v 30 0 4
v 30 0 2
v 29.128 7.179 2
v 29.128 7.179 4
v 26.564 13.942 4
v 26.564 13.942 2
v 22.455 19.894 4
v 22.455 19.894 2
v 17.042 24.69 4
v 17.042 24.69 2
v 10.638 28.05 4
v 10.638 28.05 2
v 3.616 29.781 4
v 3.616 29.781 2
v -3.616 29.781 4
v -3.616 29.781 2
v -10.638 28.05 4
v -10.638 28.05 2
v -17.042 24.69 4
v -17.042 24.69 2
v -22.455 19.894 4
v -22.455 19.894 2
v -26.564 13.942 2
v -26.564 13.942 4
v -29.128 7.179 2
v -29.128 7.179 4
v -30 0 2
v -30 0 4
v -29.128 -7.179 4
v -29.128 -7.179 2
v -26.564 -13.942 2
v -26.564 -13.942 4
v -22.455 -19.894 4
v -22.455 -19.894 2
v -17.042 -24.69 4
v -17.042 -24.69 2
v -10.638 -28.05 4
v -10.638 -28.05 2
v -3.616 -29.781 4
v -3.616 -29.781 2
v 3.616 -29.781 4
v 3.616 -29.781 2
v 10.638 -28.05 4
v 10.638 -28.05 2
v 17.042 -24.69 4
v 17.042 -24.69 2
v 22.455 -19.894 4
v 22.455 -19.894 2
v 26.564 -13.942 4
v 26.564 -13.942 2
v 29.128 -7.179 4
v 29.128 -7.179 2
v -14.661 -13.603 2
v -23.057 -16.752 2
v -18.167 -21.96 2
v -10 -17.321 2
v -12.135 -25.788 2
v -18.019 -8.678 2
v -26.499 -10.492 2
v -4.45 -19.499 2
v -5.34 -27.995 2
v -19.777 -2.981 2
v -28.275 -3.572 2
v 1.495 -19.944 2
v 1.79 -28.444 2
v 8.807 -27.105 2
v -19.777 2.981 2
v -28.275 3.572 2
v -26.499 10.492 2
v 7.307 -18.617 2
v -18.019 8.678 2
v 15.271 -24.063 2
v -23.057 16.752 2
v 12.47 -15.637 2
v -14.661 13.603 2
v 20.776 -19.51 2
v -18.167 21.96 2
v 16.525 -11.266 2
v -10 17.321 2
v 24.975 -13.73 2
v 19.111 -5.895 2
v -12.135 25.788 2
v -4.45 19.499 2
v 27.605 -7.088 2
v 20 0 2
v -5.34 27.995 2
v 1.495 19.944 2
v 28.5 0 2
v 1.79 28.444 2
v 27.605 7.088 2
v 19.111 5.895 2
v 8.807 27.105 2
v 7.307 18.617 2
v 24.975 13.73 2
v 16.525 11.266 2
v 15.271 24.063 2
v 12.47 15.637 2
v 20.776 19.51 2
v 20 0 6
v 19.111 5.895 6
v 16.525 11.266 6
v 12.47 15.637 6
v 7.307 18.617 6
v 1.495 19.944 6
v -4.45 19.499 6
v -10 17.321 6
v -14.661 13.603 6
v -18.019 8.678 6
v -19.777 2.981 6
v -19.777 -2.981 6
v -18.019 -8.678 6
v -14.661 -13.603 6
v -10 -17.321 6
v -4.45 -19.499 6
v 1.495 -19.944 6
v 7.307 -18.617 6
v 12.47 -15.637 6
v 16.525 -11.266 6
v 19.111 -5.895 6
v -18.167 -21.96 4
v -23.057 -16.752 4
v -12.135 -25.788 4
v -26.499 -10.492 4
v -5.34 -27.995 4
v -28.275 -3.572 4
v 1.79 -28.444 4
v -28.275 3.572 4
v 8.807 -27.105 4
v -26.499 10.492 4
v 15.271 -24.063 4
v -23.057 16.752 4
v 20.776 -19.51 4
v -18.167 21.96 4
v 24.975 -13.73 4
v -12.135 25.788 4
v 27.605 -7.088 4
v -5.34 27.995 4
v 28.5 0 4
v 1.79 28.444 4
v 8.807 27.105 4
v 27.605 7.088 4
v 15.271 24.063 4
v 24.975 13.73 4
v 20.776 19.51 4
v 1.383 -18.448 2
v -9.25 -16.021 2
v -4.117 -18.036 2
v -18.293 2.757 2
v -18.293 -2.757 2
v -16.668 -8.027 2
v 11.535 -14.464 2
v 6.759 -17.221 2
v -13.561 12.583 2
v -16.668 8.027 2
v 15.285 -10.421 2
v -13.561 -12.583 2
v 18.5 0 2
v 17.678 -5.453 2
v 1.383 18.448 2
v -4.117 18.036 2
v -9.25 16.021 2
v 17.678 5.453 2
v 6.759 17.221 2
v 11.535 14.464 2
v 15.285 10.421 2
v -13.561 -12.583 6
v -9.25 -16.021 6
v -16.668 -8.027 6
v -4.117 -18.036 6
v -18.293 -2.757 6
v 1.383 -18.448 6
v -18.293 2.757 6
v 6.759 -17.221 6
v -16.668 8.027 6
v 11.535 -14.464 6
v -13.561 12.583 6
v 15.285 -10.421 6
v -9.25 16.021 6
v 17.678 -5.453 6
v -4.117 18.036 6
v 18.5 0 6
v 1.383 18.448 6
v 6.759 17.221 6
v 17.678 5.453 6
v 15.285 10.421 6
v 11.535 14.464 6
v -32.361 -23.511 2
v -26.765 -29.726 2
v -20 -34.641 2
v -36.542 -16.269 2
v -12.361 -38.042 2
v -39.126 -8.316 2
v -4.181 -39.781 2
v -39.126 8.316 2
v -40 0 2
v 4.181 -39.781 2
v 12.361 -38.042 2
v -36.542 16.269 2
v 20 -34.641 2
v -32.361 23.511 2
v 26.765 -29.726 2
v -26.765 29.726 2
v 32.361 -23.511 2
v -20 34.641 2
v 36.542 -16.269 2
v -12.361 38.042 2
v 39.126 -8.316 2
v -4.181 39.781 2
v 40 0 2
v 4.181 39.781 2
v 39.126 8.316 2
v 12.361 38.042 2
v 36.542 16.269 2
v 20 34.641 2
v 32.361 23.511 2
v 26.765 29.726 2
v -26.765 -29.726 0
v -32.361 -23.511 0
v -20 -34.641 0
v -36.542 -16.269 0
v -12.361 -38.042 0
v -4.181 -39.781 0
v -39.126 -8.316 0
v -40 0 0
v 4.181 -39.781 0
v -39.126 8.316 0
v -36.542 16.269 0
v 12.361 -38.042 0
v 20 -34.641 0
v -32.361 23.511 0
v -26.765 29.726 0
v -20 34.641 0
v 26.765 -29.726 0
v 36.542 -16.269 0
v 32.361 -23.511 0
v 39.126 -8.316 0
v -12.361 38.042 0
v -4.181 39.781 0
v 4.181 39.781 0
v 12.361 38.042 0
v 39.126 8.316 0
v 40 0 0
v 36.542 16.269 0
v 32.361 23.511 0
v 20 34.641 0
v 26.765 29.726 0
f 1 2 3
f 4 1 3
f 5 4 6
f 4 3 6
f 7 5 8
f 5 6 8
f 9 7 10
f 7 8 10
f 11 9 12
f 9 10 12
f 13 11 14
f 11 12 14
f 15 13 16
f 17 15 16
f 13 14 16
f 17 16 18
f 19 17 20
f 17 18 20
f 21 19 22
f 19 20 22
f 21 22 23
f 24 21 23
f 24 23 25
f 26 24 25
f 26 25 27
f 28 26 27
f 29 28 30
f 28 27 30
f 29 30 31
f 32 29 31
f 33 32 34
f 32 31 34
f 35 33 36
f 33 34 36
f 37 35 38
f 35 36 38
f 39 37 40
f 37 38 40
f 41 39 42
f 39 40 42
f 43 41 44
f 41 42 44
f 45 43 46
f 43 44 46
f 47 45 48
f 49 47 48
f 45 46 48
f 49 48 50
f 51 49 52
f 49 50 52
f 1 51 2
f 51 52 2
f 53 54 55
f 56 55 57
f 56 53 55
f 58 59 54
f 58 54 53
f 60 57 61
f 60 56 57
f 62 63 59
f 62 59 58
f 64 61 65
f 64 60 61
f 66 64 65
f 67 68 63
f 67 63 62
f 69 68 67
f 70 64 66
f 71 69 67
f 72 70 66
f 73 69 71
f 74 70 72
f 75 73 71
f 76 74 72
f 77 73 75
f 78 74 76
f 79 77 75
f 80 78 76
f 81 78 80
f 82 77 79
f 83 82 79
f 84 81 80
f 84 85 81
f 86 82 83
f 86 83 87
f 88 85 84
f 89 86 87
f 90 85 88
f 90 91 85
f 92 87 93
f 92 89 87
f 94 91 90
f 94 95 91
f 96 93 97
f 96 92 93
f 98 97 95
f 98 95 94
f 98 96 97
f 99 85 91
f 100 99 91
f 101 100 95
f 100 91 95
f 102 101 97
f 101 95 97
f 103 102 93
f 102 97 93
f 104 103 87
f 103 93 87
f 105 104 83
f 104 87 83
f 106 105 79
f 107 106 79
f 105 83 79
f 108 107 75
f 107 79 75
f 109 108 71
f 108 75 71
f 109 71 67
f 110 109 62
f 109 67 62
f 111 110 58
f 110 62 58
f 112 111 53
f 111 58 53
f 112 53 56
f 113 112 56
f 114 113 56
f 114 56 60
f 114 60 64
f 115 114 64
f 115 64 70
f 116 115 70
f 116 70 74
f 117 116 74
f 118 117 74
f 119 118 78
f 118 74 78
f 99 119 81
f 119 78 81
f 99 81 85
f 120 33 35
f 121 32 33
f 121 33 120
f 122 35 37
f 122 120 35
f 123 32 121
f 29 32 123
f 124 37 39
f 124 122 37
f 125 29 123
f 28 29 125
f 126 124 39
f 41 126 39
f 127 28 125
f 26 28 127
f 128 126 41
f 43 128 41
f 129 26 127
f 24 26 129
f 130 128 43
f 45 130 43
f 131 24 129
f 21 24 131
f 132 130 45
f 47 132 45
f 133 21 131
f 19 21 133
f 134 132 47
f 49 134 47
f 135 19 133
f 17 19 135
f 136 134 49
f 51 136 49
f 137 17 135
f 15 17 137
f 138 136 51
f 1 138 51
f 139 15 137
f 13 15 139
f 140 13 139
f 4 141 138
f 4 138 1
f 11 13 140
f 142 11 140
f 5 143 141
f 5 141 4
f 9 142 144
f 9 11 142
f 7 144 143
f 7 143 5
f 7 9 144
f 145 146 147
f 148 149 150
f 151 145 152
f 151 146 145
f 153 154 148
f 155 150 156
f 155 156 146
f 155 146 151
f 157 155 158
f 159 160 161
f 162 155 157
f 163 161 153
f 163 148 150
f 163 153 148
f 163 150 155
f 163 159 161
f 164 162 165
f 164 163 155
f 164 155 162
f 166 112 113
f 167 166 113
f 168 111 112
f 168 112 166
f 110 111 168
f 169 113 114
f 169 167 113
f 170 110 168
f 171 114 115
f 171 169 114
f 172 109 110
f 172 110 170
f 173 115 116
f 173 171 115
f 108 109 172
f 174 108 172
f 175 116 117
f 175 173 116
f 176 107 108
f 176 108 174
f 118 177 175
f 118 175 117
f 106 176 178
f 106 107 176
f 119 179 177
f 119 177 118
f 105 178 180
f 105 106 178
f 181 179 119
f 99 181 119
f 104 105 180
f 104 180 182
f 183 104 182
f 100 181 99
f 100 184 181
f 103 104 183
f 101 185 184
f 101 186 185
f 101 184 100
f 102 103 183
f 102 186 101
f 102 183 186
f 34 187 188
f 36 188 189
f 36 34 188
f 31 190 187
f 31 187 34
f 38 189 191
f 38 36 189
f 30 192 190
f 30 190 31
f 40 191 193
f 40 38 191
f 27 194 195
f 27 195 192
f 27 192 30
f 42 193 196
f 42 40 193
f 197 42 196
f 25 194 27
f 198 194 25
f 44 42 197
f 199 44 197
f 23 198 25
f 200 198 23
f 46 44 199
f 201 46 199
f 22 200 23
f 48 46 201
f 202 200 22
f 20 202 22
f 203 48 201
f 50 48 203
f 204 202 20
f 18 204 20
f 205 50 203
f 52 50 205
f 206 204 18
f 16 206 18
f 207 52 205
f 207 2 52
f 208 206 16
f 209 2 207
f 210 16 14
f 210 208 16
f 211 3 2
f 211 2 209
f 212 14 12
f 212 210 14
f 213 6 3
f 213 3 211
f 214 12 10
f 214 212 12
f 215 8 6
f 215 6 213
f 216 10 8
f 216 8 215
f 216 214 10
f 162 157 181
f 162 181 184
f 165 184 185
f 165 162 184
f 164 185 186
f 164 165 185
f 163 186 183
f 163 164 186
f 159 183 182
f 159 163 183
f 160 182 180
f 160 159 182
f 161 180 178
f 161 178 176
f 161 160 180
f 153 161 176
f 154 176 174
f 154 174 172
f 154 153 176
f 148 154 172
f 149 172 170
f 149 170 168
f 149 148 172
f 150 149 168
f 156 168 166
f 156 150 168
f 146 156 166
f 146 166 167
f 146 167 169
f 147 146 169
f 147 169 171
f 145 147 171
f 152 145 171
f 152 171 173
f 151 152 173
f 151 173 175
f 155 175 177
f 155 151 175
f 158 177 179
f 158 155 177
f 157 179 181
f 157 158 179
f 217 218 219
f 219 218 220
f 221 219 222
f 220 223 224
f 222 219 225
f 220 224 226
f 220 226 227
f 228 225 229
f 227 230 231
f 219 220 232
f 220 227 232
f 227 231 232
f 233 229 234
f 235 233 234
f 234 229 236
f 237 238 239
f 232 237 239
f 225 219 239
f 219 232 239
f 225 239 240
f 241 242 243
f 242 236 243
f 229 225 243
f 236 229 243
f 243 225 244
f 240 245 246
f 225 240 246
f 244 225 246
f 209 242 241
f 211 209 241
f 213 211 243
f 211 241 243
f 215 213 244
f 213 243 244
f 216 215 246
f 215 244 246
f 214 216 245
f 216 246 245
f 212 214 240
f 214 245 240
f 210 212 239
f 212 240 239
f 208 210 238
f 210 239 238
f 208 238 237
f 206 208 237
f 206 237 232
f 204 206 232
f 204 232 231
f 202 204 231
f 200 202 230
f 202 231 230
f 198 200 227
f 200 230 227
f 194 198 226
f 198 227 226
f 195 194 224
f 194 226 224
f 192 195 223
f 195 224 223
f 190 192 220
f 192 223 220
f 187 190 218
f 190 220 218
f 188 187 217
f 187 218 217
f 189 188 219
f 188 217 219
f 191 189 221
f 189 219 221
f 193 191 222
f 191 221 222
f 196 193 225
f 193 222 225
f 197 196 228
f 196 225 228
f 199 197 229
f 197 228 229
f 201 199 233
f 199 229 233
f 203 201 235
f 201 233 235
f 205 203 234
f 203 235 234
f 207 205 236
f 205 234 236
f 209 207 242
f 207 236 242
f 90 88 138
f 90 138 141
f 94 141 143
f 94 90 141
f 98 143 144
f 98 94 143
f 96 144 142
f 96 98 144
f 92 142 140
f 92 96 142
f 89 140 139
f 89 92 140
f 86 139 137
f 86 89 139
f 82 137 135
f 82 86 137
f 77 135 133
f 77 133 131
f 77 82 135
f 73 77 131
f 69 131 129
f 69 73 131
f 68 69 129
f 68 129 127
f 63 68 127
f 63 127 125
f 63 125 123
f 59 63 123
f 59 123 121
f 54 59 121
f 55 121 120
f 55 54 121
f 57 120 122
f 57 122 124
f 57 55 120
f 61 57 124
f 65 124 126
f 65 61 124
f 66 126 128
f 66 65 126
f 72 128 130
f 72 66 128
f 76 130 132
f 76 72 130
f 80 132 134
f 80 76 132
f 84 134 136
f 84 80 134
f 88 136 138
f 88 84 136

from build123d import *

# Parameters (mm, degrees)
F0_R     = 40
F1_DEPTH = 2
F2_R     = 30
F2_R_2   = 28.5
F3_DEPTH = 2
F4_R     = 20
F4_R_2   = 18.5
F5_DEPTH = 4


with BuildPart() as f1:
    # F0 (on Top) → F1 (new body)
    with BuildSketch(Plane.XY):
        Circle(F0_R)
    extrude(amount=F1_DEPTH)

    # F2 (on face) → F3 (join)
    with BuildSketch(Plane.XY.offset(2)):
        Circle(F2_R)
        Circle(F2_R_2, mode=Mode.SUBTRACT)
    extrude(amount=F3_DEPTH)

    # F4 (on face) → F5 (join)
    with BuildSketch(Plane.XY.offset(2)):
        Circle(F4_R)
        Circle(F4_R_2, mode=Mode.SUBTRACT)
    extrude(amount=F5_DEPTH)


solid = f1.part
